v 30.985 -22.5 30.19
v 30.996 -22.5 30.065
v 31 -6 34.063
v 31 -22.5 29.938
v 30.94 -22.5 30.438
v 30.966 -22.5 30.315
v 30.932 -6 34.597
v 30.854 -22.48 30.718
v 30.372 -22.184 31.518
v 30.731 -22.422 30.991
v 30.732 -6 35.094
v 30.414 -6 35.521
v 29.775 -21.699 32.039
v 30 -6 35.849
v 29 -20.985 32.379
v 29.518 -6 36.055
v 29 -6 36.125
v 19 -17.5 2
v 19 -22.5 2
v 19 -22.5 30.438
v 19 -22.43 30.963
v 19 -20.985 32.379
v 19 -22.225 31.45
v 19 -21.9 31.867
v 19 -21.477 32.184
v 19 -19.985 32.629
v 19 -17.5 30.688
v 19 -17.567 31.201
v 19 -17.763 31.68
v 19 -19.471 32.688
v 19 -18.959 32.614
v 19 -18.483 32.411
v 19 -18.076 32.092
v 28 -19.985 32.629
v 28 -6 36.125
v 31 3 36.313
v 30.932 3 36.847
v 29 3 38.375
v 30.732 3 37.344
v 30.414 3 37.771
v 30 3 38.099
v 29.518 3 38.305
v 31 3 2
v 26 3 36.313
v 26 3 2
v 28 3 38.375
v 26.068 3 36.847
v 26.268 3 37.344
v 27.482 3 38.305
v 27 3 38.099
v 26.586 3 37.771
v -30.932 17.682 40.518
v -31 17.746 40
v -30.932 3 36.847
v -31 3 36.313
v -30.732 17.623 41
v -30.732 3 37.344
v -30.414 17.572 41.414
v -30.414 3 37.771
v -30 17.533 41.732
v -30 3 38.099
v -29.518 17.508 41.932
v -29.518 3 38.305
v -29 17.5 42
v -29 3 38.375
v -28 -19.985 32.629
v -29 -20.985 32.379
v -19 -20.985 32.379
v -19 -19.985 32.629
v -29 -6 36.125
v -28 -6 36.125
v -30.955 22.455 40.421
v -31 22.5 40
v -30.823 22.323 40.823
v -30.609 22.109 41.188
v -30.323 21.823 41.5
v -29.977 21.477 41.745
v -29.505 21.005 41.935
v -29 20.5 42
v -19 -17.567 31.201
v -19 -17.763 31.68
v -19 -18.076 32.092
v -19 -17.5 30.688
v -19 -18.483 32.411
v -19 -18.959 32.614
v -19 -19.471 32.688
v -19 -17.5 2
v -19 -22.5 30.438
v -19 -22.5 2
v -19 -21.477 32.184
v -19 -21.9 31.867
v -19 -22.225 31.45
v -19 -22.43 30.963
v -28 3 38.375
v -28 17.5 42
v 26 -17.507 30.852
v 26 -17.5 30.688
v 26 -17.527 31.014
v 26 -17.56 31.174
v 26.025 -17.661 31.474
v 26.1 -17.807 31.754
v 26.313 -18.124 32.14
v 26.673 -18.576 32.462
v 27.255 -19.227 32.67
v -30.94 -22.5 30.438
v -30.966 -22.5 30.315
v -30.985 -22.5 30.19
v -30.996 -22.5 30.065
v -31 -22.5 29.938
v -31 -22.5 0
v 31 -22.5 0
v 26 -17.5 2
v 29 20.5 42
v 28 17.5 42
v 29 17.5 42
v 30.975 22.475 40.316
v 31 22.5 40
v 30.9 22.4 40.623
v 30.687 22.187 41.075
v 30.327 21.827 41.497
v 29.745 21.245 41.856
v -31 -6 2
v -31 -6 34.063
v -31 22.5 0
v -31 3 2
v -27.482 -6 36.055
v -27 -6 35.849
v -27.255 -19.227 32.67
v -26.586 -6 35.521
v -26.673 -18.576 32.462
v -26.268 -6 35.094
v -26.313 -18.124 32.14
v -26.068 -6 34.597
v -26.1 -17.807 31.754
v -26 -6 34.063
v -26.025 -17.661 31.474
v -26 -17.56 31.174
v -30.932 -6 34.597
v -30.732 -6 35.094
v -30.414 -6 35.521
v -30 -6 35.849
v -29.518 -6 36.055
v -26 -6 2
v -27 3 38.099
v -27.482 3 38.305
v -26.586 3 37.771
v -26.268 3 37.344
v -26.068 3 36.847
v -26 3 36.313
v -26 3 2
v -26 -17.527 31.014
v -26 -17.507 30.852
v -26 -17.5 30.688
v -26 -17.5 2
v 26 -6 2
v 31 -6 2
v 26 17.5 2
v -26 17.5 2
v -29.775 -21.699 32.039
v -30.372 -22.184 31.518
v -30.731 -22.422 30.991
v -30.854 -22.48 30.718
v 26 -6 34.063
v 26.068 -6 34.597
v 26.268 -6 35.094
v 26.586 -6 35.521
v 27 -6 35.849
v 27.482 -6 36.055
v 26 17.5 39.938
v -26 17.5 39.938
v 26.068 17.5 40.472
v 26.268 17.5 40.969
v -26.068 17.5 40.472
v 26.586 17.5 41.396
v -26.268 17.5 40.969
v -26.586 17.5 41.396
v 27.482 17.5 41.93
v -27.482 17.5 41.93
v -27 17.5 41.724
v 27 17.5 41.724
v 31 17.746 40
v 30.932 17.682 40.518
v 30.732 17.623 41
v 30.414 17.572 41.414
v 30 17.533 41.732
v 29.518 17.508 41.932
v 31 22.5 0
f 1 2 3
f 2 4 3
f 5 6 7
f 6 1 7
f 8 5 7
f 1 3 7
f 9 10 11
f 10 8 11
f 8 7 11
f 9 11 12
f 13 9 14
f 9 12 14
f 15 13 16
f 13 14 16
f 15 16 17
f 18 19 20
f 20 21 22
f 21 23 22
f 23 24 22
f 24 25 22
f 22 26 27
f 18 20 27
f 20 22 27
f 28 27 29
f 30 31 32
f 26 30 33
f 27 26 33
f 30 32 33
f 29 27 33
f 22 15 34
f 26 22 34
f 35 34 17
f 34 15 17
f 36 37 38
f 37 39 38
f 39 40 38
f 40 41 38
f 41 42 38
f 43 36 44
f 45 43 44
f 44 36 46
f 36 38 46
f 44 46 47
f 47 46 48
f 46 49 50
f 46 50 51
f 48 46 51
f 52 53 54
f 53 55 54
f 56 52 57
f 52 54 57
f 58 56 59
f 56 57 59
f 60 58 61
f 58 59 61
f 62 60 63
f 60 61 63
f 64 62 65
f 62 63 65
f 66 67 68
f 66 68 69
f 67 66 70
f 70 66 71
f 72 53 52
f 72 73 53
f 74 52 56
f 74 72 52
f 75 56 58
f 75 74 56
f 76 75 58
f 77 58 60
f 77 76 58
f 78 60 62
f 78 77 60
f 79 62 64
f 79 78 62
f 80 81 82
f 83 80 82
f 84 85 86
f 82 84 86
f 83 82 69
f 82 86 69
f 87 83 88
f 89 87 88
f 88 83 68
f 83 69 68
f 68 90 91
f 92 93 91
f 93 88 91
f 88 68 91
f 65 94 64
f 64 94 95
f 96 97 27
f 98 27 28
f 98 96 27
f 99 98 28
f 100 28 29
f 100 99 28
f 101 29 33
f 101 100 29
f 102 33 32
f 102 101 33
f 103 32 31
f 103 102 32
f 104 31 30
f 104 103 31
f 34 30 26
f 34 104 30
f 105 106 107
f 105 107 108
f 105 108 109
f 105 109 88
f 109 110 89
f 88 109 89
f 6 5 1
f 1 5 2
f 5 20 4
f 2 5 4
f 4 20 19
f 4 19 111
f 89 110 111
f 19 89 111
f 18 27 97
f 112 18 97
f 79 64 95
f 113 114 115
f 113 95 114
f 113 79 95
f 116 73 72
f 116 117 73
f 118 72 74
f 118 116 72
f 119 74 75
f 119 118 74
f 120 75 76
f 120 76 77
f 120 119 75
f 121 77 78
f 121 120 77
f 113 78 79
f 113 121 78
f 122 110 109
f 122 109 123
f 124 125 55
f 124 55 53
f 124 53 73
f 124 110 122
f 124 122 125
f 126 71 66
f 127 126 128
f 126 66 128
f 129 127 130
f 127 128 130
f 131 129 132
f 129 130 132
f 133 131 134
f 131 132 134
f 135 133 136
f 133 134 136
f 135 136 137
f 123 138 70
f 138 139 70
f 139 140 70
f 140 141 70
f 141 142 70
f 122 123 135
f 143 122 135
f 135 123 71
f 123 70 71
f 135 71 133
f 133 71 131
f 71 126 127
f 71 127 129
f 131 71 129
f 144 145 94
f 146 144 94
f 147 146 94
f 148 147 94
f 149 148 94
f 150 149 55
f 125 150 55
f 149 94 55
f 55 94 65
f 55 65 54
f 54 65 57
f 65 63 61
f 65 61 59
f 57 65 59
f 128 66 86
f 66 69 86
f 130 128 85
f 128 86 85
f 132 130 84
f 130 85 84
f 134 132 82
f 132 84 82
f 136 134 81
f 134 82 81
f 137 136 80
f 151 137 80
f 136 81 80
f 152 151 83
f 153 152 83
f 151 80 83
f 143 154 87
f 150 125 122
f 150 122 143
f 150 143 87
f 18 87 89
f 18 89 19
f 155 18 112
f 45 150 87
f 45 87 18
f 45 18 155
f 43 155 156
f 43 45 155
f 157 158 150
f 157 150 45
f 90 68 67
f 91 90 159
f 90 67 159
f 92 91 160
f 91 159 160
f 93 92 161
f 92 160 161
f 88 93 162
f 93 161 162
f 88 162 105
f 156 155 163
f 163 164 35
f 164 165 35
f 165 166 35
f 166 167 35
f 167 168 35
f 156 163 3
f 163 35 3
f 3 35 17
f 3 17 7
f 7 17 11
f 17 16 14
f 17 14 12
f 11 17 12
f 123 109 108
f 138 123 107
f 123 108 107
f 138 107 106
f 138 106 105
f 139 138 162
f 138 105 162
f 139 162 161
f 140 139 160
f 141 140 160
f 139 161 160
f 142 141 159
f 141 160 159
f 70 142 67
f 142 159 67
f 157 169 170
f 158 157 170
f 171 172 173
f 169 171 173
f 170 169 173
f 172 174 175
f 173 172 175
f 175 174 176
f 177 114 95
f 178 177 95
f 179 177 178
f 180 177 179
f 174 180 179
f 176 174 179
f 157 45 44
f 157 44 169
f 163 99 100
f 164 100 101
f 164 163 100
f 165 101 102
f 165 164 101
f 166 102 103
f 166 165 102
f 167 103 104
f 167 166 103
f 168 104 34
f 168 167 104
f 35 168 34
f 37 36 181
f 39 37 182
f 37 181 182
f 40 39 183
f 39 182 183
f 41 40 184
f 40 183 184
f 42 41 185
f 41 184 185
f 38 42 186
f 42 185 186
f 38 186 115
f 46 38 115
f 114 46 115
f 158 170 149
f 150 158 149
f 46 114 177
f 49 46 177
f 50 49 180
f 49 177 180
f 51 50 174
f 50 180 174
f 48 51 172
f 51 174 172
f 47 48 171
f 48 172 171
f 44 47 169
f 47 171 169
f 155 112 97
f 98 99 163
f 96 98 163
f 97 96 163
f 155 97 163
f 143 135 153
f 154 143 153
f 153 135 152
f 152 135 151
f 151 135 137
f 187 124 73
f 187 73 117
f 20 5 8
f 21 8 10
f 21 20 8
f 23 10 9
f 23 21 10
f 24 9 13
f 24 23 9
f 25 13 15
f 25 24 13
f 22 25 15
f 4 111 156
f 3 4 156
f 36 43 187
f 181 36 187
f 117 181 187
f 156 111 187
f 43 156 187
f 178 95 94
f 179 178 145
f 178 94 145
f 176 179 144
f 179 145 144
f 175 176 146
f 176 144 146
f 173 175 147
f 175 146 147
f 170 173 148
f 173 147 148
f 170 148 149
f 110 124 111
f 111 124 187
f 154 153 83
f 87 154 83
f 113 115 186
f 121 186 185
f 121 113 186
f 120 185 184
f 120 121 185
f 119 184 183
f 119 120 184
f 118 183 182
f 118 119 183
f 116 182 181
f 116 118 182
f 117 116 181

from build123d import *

# Parameters (mm, degrees)
F0_W     = 62
F0_H     = 45
F1_DEPTH = 42
F3_DEPTH = 40
F5_DEPTH = 62.001
F6_R     = 2


with BuildPart() as f1:
    # F0 (on Top) → F1 (new body)
    with BuildSketch(Plane.XY):
        Rectangle(F0_W, F0_H)
    extrude(amount=F1_DEPTH)

    # F2 (on face) → F3 (cut)
    with BuildSketch(Plane.XY.offset(42)):
        Polygon((-19, -17.5), (-19, -22.5), (19, -22.5), (19, -17.5), (26, -17.5), (26, -6), (31, -6), (31, 3), (26, 3), (26, 17.5), (-26, 17.5), (-26, 3), (-31, 3), (-31, -6), (-26, -6), (-26, -17.5), align=None)
    extrude(amount=-F3_DEPTH, mode=Mode.SUBTRACT)

    # F4 (on face) → F5 (cut, through all)
    with BuildSketch(Plane.YZ.offset(31)):
        Polygon((17.5, 42), (-22.5, 42), (-22.5, 32), align=None)
    extrude(amount=-F5_DEPTH, mode=Mode.SUBTRACT)

    # F6
    f6_edges = [f1.edges().sort_by_distance(p)[0] for p in [
        (22.5, -17.5, 33.25),
        (26, -11.75, 34.6875),
        (31, -14.25, 34.0625),
        (25, -22.5, 32),
        (26, 10.25, 40.1875),
        (-26, 10.25, 40.1875),
        (-31, -14.25, 34.0625),
        (-31, 10.25, 40.1875),
        (-26, -11.75, 34.6875),
        (-22.5, -17.5, 33.25),
        (-25, -22.5, 32),
        (31, 10.25, 40.1875),
        (31, 20, 42),
        (0, 22.5, 42),
        (-31, 20, 42),
    ]]
    fillet(f6_edges, radius=F6_R)


solid = f1.part
